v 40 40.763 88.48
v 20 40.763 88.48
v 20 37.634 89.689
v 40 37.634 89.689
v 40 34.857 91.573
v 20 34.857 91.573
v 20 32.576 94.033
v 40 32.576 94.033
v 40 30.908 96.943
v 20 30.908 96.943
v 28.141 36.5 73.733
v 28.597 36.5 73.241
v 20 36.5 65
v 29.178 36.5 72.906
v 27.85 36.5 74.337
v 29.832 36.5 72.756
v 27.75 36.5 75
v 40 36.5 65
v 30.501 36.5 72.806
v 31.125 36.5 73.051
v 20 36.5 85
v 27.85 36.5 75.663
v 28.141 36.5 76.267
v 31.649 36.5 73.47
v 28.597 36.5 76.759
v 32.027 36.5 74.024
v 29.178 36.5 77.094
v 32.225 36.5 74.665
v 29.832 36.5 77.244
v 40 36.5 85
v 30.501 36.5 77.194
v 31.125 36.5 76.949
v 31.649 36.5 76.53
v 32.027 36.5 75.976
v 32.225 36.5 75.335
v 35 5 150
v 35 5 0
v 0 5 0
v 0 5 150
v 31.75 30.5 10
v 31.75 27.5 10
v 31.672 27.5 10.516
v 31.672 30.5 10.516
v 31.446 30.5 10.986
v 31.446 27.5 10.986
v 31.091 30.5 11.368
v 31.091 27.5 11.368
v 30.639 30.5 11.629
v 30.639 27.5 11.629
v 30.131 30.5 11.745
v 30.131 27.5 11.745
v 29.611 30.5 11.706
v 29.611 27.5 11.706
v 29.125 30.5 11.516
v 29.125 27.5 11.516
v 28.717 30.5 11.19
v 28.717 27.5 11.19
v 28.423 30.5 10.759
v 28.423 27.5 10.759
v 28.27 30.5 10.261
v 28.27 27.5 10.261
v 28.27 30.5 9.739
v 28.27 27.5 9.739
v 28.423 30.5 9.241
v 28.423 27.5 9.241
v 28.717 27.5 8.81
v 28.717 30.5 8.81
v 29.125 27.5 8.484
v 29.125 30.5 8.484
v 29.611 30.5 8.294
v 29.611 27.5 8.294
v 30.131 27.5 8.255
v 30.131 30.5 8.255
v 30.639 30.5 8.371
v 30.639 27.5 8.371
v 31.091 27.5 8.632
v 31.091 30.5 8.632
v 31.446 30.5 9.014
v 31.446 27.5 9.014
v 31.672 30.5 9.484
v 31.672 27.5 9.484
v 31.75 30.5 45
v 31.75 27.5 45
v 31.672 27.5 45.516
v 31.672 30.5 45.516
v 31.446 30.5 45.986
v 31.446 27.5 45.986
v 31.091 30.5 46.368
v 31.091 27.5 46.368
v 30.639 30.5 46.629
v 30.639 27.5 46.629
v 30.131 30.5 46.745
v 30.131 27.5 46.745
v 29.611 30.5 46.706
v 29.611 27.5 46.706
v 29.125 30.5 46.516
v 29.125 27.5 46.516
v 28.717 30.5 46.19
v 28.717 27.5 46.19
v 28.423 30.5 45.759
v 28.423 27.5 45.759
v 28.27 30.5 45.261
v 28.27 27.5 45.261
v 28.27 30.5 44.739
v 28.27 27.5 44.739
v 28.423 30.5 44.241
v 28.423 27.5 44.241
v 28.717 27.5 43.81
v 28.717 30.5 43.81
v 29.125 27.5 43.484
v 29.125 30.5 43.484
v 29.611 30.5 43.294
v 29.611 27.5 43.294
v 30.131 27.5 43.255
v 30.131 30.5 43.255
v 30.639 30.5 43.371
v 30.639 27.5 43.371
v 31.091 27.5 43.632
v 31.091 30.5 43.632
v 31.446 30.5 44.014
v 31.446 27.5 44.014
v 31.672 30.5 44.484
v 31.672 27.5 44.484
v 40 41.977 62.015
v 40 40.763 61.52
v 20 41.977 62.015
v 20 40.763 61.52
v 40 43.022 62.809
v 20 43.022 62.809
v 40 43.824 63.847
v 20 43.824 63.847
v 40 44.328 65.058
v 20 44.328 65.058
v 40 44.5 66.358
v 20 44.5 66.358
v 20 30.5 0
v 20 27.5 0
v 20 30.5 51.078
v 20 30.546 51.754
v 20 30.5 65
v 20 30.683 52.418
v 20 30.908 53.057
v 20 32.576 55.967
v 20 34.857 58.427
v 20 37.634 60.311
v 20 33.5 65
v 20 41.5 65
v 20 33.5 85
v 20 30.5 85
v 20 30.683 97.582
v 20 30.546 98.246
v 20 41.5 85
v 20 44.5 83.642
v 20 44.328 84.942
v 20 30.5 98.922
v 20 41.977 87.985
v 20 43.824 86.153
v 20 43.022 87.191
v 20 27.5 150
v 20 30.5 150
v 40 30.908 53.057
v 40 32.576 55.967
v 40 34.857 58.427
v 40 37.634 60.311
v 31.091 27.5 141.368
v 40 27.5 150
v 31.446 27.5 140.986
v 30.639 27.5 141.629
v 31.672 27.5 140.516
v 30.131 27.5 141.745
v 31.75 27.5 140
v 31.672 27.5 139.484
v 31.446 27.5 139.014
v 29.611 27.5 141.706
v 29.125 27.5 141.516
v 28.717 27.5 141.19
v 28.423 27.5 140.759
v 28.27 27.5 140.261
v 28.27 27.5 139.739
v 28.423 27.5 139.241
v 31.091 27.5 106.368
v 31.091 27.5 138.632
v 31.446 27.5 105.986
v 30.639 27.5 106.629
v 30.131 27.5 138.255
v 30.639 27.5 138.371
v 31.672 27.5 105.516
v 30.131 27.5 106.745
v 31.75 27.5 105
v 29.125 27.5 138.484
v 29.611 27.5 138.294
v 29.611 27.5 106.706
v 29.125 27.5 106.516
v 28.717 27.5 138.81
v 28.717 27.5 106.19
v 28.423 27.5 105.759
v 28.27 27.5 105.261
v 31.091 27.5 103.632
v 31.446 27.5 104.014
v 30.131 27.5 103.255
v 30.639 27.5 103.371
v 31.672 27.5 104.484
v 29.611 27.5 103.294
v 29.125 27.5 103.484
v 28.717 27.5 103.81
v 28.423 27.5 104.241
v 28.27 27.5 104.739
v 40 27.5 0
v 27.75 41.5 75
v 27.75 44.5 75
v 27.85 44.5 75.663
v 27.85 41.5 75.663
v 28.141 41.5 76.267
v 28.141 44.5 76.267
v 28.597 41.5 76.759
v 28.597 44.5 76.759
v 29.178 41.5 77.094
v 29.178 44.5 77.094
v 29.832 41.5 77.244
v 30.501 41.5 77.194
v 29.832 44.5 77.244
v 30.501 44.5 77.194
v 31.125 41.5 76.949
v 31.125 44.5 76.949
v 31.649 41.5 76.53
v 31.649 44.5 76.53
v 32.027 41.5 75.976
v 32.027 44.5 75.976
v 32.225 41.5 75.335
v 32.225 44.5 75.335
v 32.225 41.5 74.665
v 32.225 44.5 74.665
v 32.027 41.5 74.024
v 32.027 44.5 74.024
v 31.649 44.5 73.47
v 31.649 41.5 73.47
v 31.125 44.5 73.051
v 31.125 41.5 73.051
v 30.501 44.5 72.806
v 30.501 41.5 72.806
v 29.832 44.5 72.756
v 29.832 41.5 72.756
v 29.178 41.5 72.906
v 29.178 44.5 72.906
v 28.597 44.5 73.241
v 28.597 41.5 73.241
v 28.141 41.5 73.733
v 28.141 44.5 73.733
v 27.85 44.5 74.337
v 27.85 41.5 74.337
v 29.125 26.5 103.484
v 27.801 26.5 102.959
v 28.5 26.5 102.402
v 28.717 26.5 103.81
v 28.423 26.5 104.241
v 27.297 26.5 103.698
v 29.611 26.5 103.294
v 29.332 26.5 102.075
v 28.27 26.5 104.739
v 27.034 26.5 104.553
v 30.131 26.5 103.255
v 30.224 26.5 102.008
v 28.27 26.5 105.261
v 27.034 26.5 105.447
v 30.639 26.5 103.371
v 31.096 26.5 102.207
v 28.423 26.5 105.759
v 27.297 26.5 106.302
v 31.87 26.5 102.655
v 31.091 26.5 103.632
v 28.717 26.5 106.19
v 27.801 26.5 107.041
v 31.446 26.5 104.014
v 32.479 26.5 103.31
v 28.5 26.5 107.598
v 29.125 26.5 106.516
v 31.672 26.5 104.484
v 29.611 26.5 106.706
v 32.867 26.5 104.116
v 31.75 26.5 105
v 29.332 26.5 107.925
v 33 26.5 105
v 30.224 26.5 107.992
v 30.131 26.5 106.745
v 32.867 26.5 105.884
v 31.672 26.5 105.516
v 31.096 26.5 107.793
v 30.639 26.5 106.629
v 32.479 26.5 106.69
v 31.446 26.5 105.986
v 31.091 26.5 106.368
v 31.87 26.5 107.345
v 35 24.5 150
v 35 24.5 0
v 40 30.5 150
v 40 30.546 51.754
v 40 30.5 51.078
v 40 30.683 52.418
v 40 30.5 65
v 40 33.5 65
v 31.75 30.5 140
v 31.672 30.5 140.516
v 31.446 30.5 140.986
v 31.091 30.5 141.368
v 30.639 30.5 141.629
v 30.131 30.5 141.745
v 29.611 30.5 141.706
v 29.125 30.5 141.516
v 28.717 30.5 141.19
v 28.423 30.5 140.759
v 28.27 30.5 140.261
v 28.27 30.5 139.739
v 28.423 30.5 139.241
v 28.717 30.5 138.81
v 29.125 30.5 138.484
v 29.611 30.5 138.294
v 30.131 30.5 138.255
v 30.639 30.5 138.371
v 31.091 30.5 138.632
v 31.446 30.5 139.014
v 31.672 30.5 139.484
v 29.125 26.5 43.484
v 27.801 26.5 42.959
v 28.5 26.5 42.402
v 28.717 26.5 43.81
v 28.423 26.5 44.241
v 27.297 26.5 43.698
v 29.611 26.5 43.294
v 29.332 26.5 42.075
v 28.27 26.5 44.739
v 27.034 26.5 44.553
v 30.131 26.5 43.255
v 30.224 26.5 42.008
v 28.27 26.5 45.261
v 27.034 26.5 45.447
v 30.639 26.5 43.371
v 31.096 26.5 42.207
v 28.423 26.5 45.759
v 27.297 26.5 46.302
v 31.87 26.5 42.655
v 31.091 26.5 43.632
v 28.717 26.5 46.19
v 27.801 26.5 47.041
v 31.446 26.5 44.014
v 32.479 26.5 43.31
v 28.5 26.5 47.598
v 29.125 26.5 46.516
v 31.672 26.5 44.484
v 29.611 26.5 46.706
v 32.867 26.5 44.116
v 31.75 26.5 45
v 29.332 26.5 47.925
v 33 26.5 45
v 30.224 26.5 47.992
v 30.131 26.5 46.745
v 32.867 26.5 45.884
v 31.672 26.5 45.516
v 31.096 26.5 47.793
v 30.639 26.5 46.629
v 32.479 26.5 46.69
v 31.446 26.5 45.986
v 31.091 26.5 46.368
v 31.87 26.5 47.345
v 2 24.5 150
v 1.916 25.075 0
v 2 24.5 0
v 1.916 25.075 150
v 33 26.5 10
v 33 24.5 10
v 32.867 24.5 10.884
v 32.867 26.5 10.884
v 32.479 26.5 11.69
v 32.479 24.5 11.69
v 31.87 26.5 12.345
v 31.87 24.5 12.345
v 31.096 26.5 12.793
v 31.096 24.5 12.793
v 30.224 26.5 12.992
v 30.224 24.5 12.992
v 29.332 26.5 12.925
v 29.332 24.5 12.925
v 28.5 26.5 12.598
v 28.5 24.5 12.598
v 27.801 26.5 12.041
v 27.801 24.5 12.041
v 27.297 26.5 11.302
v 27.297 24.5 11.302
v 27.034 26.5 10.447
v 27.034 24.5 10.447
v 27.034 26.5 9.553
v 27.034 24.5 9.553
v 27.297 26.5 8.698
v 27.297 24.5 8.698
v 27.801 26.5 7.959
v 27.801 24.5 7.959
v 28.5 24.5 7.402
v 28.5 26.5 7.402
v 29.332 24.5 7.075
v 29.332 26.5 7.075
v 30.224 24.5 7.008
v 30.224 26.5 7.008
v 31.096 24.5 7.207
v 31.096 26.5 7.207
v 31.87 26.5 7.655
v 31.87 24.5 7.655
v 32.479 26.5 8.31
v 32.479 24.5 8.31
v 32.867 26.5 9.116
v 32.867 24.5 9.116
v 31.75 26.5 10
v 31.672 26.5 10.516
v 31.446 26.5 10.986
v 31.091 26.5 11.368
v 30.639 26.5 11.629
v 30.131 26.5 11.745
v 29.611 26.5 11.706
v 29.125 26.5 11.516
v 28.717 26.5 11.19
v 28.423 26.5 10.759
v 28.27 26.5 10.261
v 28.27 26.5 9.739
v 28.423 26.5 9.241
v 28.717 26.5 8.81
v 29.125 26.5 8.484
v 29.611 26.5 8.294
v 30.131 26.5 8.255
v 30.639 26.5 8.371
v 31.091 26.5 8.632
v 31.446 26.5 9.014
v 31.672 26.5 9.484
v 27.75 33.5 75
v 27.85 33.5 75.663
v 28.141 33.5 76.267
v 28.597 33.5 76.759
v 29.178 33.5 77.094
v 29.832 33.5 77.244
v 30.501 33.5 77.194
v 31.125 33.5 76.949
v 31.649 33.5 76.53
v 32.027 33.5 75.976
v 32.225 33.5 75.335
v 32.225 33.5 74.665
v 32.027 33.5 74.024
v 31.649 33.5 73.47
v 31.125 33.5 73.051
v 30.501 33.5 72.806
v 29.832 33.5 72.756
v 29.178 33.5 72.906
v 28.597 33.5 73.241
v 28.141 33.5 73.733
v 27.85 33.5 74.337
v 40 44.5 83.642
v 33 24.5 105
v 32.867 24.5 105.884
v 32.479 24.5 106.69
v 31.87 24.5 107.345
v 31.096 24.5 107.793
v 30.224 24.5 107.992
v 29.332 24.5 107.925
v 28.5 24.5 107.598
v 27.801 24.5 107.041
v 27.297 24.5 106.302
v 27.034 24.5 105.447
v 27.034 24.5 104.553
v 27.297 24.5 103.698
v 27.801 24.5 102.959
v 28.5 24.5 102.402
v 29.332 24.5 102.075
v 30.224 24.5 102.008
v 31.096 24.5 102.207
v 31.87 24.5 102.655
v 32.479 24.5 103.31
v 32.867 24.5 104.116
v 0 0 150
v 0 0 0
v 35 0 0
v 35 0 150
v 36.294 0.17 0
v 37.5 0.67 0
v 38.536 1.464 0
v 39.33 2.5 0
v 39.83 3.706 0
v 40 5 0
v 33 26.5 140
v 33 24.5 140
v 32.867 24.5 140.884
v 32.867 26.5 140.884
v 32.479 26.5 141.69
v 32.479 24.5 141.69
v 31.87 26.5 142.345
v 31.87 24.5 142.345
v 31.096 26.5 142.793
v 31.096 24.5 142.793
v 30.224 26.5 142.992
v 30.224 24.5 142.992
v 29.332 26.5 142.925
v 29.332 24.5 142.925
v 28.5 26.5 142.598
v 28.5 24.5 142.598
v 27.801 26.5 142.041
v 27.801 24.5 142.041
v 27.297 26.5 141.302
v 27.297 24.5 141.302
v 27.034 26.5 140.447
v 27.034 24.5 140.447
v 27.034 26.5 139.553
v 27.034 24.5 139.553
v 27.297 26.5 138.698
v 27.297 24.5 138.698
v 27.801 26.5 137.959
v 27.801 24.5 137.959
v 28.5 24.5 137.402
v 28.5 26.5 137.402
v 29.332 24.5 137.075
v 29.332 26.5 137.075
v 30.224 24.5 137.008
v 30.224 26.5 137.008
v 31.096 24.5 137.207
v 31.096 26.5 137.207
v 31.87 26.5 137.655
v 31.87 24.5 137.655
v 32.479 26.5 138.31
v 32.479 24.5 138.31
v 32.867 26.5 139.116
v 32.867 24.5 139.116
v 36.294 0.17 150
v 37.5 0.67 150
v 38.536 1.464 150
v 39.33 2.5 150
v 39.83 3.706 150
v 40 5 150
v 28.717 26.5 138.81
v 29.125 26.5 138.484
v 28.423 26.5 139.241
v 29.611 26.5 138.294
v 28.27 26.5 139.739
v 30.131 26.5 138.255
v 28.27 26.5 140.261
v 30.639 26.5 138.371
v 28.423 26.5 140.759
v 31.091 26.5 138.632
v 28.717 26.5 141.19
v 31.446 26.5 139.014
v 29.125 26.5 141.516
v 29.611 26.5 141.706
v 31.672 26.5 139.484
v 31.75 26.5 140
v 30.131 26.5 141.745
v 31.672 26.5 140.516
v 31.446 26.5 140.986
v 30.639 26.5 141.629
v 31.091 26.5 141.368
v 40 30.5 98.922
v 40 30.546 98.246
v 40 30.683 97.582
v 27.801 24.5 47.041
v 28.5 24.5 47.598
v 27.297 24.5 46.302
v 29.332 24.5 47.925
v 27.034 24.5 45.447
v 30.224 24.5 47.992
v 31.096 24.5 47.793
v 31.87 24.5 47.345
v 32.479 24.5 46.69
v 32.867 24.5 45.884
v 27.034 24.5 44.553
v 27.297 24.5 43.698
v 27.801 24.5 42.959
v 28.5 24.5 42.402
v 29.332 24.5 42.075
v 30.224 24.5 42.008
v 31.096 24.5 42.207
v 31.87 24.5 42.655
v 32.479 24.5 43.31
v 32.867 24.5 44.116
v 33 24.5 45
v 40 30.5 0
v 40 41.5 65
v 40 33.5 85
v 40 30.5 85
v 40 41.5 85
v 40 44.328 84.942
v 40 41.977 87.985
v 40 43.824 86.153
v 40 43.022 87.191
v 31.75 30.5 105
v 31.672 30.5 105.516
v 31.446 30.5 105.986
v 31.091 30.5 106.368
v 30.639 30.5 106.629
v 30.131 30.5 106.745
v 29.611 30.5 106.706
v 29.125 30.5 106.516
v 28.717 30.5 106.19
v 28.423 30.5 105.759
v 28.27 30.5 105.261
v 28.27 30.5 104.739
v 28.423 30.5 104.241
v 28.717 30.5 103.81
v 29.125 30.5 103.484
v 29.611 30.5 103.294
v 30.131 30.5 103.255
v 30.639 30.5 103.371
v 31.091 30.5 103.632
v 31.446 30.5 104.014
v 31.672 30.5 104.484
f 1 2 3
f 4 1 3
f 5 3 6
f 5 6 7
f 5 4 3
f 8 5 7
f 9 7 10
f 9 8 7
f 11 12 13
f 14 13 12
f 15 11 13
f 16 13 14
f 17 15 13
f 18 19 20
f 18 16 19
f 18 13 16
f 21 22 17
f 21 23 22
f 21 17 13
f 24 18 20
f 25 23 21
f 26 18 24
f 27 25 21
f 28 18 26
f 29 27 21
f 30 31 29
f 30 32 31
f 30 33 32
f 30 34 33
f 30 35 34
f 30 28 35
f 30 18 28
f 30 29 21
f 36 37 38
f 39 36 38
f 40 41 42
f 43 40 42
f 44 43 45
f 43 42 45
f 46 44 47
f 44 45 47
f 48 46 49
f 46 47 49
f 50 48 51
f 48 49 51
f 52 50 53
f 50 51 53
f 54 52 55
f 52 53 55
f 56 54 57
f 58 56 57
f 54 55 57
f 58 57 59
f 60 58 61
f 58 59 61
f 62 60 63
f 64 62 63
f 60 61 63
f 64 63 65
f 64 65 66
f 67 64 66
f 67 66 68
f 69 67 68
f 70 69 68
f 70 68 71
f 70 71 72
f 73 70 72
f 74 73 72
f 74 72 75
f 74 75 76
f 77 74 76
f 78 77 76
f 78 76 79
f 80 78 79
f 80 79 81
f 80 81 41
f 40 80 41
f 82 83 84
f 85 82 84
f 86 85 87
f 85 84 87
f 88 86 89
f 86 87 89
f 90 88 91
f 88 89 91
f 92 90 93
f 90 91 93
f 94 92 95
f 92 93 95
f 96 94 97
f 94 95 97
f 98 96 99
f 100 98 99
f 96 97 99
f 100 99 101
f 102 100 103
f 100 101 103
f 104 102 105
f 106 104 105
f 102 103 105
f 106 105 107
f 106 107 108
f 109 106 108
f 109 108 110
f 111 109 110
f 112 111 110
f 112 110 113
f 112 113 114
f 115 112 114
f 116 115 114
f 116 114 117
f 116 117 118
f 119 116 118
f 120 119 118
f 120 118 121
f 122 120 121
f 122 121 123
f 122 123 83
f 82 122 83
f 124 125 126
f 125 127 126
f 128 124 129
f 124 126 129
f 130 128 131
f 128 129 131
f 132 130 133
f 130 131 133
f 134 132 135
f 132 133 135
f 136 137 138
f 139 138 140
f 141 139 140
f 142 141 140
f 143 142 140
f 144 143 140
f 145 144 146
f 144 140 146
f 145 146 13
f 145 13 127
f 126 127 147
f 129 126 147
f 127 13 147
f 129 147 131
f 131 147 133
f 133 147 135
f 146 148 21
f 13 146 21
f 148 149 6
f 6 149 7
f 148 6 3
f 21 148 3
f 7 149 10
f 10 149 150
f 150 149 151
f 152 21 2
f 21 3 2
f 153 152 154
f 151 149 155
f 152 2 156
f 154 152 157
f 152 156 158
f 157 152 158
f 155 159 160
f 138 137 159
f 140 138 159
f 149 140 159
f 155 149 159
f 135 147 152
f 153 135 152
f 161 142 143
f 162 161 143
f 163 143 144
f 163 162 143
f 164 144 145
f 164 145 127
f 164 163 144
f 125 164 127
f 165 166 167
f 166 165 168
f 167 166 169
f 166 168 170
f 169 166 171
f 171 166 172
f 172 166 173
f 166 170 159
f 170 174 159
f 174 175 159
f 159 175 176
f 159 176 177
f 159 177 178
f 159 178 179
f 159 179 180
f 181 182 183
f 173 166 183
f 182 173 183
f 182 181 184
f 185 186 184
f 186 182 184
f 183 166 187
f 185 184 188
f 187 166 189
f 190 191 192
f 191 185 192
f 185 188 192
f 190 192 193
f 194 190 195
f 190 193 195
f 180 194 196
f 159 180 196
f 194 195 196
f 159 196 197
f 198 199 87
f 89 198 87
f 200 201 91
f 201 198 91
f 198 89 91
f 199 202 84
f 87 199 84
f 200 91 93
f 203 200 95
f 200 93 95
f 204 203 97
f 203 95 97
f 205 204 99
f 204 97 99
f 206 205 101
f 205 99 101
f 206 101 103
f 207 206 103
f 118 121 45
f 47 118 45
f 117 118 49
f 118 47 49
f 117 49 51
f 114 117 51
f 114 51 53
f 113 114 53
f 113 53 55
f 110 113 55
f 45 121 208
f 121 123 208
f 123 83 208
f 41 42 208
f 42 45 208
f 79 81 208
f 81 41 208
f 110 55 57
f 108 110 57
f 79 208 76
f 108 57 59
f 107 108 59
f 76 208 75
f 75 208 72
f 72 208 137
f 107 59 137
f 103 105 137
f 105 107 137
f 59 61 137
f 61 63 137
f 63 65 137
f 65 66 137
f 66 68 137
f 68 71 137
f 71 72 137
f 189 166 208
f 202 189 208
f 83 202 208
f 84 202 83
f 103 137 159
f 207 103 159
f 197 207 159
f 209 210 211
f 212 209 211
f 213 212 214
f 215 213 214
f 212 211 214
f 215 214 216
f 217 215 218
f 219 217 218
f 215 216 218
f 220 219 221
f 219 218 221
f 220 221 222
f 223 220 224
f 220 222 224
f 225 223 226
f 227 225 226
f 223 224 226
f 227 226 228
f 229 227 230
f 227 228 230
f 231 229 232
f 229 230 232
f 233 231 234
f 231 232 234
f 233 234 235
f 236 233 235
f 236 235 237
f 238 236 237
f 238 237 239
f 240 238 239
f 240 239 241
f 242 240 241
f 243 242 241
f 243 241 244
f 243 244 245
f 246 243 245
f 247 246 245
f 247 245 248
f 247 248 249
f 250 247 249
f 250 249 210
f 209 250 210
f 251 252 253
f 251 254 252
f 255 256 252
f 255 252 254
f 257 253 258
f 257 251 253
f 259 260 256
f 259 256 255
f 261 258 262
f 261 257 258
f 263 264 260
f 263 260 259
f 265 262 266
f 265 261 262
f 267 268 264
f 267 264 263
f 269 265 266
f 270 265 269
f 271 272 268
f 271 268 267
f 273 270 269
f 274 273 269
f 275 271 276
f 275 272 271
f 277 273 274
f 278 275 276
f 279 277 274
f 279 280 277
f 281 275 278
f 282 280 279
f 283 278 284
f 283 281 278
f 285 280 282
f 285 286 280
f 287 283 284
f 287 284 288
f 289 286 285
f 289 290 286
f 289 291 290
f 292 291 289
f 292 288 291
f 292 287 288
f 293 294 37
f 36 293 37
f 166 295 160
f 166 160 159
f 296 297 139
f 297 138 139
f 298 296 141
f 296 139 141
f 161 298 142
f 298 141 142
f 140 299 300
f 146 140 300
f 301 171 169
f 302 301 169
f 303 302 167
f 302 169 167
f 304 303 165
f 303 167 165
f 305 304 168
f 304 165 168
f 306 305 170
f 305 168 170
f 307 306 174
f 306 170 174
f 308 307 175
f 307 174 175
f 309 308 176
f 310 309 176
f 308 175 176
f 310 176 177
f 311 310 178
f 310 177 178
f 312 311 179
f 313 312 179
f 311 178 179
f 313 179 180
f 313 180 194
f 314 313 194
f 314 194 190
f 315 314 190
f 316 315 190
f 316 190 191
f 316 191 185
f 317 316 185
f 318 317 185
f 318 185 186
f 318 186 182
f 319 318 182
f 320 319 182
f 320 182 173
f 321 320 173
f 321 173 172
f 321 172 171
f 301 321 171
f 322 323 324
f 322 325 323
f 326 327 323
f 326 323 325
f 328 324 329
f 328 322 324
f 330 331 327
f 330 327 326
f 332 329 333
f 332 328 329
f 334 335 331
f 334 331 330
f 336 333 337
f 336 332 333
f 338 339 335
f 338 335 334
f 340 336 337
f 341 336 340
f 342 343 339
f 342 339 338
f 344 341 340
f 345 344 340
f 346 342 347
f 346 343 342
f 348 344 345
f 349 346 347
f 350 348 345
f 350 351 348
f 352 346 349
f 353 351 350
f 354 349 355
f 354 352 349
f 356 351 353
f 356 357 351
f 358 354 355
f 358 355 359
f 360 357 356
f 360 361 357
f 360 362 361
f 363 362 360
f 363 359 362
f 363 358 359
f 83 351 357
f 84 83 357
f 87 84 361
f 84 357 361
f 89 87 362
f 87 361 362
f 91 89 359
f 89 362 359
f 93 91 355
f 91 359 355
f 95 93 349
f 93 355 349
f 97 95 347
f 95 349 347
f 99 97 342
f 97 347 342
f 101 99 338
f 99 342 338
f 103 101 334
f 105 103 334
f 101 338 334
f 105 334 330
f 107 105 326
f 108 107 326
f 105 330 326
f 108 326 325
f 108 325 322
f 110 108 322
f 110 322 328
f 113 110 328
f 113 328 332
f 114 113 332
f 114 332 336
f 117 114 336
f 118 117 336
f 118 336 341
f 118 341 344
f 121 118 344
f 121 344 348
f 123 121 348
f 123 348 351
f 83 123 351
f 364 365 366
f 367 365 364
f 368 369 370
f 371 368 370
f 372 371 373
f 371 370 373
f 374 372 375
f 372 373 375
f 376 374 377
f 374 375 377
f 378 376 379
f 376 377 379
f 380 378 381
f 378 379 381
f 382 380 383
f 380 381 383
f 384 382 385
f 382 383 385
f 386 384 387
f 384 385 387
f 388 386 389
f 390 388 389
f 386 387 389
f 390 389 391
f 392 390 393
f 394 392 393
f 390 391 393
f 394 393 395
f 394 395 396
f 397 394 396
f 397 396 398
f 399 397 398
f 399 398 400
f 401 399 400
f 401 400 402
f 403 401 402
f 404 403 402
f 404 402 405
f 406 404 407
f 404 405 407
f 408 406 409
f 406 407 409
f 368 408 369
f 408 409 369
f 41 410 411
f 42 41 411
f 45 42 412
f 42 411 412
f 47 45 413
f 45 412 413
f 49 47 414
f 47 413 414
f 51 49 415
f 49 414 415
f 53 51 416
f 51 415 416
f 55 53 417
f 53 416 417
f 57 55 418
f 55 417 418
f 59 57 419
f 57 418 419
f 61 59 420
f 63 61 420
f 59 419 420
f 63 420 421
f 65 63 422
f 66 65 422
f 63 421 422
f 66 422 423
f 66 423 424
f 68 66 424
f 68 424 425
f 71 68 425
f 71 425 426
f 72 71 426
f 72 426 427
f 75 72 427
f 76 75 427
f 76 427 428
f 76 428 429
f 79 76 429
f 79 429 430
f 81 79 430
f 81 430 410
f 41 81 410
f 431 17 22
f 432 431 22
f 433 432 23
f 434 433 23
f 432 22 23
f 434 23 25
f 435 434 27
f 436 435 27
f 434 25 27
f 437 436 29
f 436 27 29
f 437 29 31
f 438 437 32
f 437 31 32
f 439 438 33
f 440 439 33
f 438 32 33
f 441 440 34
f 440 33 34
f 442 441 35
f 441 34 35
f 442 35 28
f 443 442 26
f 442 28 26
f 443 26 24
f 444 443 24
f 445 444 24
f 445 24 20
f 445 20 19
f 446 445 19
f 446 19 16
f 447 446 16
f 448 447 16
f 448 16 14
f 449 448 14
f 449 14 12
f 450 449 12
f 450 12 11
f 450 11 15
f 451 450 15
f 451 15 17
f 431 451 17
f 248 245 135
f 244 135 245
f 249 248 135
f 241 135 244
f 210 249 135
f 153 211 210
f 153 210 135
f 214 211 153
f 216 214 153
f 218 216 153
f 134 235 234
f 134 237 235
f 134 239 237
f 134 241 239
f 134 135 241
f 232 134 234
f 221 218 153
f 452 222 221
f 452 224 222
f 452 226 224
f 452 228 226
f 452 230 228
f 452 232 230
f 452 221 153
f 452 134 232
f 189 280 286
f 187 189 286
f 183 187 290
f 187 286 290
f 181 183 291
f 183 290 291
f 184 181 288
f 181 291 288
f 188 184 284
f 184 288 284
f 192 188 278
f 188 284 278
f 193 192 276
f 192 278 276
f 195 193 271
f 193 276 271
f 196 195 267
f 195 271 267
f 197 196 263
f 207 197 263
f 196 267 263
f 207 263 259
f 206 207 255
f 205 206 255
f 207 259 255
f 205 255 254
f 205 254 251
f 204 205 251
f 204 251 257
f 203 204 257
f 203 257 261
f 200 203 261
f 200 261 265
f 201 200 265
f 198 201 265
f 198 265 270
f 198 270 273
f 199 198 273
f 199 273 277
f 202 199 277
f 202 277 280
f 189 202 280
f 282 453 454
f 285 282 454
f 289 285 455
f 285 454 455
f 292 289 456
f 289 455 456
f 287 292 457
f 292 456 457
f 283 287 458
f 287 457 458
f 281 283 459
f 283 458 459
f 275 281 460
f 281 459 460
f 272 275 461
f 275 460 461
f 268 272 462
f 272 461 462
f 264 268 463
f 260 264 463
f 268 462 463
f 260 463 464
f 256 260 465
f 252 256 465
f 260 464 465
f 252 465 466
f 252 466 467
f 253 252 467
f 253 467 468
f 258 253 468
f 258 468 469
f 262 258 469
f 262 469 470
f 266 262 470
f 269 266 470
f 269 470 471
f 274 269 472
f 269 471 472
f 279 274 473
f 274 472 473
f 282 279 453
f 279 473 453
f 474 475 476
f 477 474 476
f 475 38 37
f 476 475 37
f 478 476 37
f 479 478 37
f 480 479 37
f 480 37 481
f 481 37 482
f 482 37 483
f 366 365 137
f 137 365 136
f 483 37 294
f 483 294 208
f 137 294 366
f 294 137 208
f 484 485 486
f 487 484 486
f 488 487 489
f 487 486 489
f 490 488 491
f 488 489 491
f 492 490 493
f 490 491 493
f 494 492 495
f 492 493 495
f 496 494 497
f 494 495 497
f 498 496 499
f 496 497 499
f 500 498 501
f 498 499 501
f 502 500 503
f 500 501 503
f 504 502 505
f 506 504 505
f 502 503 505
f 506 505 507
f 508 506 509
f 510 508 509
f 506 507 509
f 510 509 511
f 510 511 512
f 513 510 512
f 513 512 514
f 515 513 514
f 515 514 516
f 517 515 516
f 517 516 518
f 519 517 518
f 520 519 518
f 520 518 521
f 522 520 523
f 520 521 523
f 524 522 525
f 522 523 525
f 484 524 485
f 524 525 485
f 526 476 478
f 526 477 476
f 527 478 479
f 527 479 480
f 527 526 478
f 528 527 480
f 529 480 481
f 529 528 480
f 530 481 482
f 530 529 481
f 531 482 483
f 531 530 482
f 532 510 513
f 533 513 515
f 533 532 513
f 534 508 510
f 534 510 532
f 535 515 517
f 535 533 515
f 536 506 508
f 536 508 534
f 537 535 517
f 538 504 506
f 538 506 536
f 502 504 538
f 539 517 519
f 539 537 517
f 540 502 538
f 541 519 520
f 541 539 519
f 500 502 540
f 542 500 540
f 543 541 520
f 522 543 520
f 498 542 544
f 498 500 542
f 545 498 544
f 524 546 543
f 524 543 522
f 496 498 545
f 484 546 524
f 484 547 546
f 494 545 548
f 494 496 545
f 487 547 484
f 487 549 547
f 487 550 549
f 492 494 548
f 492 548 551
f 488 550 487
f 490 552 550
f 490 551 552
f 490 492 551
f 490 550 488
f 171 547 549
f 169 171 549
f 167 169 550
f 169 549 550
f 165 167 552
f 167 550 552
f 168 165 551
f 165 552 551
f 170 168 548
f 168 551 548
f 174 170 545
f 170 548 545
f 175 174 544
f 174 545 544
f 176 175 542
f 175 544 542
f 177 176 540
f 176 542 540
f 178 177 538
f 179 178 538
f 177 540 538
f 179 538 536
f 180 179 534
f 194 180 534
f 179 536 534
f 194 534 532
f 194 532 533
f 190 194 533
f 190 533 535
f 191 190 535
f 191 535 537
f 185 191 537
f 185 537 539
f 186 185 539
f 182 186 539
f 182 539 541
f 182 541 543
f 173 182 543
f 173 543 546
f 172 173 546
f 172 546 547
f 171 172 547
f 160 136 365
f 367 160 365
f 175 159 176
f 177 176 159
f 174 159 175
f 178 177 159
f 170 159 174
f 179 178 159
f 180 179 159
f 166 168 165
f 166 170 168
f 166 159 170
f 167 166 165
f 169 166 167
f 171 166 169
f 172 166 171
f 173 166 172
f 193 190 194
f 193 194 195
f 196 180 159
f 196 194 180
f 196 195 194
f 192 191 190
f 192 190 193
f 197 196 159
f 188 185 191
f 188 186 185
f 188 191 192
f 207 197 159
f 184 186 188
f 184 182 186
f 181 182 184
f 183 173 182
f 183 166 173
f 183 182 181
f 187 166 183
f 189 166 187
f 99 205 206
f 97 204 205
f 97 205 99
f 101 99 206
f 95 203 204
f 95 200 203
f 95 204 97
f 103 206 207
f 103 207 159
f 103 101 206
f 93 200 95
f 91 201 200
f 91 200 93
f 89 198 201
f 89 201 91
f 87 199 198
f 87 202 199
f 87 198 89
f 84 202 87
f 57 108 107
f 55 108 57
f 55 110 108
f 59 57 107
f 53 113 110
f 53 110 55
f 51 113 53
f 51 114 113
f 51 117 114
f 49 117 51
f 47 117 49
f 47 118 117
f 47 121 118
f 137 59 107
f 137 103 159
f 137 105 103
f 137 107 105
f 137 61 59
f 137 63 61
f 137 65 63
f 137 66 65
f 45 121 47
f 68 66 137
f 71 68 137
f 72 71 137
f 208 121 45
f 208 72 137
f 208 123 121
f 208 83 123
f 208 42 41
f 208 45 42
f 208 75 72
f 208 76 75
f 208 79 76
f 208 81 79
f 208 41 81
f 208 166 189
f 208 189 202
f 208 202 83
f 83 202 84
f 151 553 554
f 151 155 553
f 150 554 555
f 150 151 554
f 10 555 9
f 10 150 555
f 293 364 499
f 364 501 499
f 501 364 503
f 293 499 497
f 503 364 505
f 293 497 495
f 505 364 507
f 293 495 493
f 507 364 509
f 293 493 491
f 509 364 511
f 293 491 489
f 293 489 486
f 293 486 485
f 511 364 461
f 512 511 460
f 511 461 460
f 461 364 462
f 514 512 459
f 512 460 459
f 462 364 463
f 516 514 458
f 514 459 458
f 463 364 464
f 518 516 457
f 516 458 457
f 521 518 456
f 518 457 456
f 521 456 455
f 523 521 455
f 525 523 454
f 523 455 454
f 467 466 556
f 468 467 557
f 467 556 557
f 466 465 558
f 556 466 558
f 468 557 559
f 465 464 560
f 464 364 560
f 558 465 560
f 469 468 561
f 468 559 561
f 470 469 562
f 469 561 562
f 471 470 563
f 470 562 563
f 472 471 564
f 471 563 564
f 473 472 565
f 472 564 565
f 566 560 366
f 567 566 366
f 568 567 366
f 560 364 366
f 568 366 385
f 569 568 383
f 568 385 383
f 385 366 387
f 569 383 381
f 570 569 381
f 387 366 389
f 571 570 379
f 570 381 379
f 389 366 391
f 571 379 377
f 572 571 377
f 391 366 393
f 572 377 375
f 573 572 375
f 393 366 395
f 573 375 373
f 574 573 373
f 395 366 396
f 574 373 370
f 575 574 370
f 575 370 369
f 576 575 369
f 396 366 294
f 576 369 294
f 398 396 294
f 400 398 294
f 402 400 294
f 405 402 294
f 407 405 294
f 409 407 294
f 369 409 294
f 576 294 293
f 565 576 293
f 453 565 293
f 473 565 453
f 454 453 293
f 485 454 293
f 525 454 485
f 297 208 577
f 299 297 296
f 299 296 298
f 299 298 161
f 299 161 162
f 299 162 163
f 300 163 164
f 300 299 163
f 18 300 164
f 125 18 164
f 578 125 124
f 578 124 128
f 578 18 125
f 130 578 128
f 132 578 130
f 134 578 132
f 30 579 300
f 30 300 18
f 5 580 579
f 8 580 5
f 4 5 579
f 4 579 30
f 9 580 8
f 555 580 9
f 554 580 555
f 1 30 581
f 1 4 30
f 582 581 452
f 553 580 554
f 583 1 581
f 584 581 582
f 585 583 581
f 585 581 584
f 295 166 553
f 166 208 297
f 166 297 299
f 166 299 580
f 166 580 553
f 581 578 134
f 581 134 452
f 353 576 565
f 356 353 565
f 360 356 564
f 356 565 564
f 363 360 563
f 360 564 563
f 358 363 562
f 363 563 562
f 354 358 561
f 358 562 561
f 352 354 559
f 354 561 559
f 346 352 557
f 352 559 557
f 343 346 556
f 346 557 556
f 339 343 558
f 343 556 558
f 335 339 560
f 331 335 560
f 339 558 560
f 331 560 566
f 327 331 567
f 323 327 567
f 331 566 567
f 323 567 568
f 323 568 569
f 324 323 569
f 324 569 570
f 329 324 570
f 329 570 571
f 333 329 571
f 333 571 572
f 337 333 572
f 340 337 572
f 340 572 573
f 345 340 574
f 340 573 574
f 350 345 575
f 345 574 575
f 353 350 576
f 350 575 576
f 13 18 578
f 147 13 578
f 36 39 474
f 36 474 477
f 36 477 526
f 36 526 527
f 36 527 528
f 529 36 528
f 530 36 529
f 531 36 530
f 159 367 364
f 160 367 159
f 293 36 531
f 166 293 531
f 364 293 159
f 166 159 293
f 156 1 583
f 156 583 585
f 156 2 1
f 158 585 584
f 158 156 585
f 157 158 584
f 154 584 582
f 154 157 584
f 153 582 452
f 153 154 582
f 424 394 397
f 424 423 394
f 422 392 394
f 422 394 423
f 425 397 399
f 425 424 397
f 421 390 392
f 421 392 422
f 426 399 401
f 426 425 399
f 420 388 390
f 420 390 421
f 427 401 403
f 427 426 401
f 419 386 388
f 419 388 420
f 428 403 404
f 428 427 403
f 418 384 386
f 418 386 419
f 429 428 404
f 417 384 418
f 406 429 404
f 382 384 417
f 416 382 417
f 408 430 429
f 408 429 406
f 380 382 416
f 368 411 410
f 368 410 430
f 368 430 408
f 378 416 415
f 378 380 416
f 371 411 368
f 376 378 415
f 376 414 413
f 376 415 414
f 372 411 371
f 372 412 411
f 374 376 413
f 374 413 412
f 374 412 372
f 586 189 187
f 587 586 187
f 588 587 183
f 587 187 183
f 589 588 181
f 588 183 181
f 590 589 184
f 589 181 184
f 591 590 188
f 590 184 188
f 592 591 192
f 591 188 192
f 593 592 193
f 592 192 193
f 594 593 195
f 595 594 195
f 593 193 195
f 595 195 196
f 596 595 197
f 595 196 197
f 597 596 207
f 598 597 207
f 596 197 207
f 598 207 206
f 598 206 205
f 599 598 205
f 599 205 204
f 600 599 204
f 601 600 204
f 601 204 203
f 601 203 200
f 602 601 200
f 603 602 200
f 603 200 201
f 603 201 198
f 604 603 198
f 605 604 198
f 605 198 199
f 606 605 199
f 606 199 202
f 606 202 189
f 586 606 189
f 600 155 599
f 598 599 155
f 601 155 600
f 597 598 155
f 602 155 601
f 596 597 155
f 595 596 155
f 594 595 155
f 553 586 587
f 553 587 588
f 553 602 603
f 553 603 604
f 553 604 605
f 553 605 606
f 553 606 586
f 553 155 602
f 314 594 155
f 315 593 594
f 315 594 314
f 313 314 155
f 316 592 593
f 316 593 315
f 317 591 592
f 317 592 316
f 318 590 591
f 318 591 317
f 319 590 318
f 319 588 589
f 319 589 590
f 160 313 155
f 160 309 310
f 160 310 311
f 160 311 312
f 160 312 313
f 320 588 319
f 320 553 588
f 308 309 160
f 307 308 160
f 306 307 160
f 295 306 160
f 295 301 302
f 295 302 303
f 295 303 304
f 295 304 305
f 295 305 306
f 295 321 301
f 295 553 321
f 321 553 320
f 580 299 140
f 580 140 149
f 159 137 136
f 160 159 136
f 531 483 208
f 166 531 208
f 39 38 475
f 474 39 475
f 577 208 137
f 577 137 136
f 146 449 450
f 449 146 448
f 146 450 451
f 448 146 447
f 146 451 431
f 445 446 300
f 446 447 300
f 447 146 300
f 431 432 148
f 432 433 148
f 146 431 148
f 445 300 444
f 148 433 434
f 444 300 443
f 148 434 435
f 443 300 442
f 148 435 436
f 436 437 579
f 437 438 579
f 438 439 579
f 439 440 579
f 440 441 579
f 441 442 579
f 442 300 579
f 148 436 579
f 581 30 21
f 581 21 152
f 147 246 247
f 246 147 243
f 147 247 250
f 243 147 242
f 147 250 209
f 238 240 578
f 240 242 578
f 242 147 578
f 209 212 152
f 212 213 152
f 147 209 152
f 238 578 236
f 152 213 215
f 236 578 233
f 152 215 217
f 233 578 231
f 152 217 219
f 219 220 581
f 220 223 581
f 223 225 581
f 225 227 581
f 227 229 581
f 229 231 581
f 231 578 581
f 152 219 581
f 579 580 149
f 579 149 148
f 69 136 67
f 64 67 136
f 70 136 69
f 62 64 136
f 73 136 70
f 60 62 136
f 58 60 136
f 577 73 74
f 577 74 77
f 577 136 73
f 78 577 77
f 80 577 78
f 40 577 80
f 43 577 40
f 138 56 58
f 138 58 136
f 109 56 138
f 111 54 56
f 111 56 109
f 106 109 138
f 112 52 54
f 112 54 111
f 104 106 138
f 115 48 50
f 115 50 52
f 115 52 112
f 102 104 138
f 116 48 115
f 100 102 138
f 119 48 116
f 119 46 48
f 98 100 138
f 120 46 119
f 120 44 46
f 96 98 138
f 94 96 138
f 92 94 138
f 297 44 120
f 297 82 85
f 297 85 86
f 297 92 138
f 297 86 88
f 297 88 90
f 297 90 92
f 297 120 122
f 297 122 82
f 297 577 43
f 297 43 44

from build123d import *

# Parameters (mm, degrees)
F1_DEPTH = 150
F2_W     = 3
F2_H     = 20
F2_W_2   = 5
F3_DEPTH = 20
F4_R     = 1.75
F5_DEPTH = 6
F6_R     = 2.25
F7_DEPTH = 14
F8_R     = 5
F4_R_2   = 3
F9_DEPTH = 2
F10_R    = 5
F11_SIZE = 2


with BuildPart() as f1:
    # F0 (on Top) → F1 (new body)
    with BuildSketch(Plane.XY):
        Polygon((0, 0), (40, 0), (40, 27.5), (20, 27.5), (20, 30.5), (0, 24.5), (20, 24.5), (35, 24.5), (35, 5), (0, 5), align=None)
    extrude(amount=F1_DEPTH)


with BuildPart() as f3:
    # F2 (on face) → F3 (new body)
    with BuildSketch(Plane.YZ.offset(40)):
        Polygon((30.5, 150), (27.5, 150), (27.5, 0), (30.5, 0), (30.5, 52), (30.5, 62), (44.5, 62), (44.5, 88), (30.5, 88), (30.5, 98), align=None)
        with Locations((32, 75)):
            Rectangle(F2_W, F2_H, mode=Mode.SUBTRACT)
        with Locations((39, 75)):
            Rectangle(F2_W_2, F2_H, mode=Mode.SUBTRACT)
        with BuildLine():
            ThreePointArc((44.5, 88), (35.897675, 90.756745), (30.5, 98))
            Line((30.5, 98), (30.5, 88))
            Line((30.5, 88), (44.5, 88))
        make_face()
        with BuildLine():
            Line((30.5, 62), (30.5, 52))
            ThreePointArc((30.5, 52), (35.897675, 59.243255), (44.5, 62))
            Line((44.5, 62), (30.5, 62))
        make_face()
    extrude(amount=-F3_DEPTH)


with BuildPart() as f5_tool:
    # F4 (on face) → F5 (new body, through all)
    with BuildSketch(Plane.XZ.offset(-24.5)):
        with Locations((30, 140)):
            Circle(F4_R)
        with Locations((30, 105)):
            Circle(F4_R)
        with Locations((30, 45)):
            Circle(F4_R)
        with Locations((30, 10)):
            Circle(F4_R)
    extrude(amount=-F5_DEPTH)


with BuildPart() as f1_1:
    add(f1.part)

    # F5: cut by f5_tool
    add(f5_tool.part, mode=Mode.SUBTRACT)

    # F4 (on face) → F9 (cut)
    with BuildSketch(Plane.XZ.offset(-24.5)):
        with Locations((30, 140)):
            Circle(F4_R_2)
        with Locations((30, 140)):
            Circle(F4_R, mode=Mode.SUBTRACT)
        with Locations((30, 105)):
            Circle(F4_R_2)
        with Locations((30, 105)):
            Circle(F4_R, mode=Mode.SUBTRACT)
        with Locations((30, 45)):
            Circle(F4_R_2)
        with Locations((30, 45)):
            Circle(F4_R, mode=Mode.SUBTRACT)
        with Locations((30, 10)):
            Circle(F4_R_2)
        with Locations((30, 10)):
            Circle(F4_R, mode=Mode.SUBTRACT)
    extrude(amount=-F9_DEPTH, mode=Mode.SUBTRACT)

    # F10
    f10_edges = [f1_1.edges().sort_by_distance(p)[0] for p in [
        (40, 0, 75),
    ]]
    fillet(f10_edges, radius=F10_R)

    # F11
    f11_edges = [f1_1.edges().sort_by_distance(p)[0] for p in [
        (0, 24.5, 75),
    ]]
    chamfer(f11_edges, length=F11_SIZE)


with BuildPart() as f3_1:
    add(f3.part)

    # F5: cut by f5_tool
    add(f5_tool.part, mode=Mode.SUBTRACT)

    # F6 (on face) → F7 (cut, through all)
    with BuildSketch(Plane(origin=(0, 44.5, 0), x_dir=(-1, 0, 0), z_dir=(0, 1, 0))):
        with Locations((-30, 75)):
            Circle(F6_R)
    extrude(amount=-F7_DEPTH, mode=Mode.SUBTRACT)

    # F8
    f8_edges = [f3_1.edges().sort_by_distance(p)[0] for p in [
        (30, 30.5, 98),
        (30, 30.5, 52),
        (30, 44.5, 88),
        (30, 44.5, 62),
    ]]
    fillet(f8_edges, radius=F8_R)


solid = Compound([f1_1.part, f3_1.part])
